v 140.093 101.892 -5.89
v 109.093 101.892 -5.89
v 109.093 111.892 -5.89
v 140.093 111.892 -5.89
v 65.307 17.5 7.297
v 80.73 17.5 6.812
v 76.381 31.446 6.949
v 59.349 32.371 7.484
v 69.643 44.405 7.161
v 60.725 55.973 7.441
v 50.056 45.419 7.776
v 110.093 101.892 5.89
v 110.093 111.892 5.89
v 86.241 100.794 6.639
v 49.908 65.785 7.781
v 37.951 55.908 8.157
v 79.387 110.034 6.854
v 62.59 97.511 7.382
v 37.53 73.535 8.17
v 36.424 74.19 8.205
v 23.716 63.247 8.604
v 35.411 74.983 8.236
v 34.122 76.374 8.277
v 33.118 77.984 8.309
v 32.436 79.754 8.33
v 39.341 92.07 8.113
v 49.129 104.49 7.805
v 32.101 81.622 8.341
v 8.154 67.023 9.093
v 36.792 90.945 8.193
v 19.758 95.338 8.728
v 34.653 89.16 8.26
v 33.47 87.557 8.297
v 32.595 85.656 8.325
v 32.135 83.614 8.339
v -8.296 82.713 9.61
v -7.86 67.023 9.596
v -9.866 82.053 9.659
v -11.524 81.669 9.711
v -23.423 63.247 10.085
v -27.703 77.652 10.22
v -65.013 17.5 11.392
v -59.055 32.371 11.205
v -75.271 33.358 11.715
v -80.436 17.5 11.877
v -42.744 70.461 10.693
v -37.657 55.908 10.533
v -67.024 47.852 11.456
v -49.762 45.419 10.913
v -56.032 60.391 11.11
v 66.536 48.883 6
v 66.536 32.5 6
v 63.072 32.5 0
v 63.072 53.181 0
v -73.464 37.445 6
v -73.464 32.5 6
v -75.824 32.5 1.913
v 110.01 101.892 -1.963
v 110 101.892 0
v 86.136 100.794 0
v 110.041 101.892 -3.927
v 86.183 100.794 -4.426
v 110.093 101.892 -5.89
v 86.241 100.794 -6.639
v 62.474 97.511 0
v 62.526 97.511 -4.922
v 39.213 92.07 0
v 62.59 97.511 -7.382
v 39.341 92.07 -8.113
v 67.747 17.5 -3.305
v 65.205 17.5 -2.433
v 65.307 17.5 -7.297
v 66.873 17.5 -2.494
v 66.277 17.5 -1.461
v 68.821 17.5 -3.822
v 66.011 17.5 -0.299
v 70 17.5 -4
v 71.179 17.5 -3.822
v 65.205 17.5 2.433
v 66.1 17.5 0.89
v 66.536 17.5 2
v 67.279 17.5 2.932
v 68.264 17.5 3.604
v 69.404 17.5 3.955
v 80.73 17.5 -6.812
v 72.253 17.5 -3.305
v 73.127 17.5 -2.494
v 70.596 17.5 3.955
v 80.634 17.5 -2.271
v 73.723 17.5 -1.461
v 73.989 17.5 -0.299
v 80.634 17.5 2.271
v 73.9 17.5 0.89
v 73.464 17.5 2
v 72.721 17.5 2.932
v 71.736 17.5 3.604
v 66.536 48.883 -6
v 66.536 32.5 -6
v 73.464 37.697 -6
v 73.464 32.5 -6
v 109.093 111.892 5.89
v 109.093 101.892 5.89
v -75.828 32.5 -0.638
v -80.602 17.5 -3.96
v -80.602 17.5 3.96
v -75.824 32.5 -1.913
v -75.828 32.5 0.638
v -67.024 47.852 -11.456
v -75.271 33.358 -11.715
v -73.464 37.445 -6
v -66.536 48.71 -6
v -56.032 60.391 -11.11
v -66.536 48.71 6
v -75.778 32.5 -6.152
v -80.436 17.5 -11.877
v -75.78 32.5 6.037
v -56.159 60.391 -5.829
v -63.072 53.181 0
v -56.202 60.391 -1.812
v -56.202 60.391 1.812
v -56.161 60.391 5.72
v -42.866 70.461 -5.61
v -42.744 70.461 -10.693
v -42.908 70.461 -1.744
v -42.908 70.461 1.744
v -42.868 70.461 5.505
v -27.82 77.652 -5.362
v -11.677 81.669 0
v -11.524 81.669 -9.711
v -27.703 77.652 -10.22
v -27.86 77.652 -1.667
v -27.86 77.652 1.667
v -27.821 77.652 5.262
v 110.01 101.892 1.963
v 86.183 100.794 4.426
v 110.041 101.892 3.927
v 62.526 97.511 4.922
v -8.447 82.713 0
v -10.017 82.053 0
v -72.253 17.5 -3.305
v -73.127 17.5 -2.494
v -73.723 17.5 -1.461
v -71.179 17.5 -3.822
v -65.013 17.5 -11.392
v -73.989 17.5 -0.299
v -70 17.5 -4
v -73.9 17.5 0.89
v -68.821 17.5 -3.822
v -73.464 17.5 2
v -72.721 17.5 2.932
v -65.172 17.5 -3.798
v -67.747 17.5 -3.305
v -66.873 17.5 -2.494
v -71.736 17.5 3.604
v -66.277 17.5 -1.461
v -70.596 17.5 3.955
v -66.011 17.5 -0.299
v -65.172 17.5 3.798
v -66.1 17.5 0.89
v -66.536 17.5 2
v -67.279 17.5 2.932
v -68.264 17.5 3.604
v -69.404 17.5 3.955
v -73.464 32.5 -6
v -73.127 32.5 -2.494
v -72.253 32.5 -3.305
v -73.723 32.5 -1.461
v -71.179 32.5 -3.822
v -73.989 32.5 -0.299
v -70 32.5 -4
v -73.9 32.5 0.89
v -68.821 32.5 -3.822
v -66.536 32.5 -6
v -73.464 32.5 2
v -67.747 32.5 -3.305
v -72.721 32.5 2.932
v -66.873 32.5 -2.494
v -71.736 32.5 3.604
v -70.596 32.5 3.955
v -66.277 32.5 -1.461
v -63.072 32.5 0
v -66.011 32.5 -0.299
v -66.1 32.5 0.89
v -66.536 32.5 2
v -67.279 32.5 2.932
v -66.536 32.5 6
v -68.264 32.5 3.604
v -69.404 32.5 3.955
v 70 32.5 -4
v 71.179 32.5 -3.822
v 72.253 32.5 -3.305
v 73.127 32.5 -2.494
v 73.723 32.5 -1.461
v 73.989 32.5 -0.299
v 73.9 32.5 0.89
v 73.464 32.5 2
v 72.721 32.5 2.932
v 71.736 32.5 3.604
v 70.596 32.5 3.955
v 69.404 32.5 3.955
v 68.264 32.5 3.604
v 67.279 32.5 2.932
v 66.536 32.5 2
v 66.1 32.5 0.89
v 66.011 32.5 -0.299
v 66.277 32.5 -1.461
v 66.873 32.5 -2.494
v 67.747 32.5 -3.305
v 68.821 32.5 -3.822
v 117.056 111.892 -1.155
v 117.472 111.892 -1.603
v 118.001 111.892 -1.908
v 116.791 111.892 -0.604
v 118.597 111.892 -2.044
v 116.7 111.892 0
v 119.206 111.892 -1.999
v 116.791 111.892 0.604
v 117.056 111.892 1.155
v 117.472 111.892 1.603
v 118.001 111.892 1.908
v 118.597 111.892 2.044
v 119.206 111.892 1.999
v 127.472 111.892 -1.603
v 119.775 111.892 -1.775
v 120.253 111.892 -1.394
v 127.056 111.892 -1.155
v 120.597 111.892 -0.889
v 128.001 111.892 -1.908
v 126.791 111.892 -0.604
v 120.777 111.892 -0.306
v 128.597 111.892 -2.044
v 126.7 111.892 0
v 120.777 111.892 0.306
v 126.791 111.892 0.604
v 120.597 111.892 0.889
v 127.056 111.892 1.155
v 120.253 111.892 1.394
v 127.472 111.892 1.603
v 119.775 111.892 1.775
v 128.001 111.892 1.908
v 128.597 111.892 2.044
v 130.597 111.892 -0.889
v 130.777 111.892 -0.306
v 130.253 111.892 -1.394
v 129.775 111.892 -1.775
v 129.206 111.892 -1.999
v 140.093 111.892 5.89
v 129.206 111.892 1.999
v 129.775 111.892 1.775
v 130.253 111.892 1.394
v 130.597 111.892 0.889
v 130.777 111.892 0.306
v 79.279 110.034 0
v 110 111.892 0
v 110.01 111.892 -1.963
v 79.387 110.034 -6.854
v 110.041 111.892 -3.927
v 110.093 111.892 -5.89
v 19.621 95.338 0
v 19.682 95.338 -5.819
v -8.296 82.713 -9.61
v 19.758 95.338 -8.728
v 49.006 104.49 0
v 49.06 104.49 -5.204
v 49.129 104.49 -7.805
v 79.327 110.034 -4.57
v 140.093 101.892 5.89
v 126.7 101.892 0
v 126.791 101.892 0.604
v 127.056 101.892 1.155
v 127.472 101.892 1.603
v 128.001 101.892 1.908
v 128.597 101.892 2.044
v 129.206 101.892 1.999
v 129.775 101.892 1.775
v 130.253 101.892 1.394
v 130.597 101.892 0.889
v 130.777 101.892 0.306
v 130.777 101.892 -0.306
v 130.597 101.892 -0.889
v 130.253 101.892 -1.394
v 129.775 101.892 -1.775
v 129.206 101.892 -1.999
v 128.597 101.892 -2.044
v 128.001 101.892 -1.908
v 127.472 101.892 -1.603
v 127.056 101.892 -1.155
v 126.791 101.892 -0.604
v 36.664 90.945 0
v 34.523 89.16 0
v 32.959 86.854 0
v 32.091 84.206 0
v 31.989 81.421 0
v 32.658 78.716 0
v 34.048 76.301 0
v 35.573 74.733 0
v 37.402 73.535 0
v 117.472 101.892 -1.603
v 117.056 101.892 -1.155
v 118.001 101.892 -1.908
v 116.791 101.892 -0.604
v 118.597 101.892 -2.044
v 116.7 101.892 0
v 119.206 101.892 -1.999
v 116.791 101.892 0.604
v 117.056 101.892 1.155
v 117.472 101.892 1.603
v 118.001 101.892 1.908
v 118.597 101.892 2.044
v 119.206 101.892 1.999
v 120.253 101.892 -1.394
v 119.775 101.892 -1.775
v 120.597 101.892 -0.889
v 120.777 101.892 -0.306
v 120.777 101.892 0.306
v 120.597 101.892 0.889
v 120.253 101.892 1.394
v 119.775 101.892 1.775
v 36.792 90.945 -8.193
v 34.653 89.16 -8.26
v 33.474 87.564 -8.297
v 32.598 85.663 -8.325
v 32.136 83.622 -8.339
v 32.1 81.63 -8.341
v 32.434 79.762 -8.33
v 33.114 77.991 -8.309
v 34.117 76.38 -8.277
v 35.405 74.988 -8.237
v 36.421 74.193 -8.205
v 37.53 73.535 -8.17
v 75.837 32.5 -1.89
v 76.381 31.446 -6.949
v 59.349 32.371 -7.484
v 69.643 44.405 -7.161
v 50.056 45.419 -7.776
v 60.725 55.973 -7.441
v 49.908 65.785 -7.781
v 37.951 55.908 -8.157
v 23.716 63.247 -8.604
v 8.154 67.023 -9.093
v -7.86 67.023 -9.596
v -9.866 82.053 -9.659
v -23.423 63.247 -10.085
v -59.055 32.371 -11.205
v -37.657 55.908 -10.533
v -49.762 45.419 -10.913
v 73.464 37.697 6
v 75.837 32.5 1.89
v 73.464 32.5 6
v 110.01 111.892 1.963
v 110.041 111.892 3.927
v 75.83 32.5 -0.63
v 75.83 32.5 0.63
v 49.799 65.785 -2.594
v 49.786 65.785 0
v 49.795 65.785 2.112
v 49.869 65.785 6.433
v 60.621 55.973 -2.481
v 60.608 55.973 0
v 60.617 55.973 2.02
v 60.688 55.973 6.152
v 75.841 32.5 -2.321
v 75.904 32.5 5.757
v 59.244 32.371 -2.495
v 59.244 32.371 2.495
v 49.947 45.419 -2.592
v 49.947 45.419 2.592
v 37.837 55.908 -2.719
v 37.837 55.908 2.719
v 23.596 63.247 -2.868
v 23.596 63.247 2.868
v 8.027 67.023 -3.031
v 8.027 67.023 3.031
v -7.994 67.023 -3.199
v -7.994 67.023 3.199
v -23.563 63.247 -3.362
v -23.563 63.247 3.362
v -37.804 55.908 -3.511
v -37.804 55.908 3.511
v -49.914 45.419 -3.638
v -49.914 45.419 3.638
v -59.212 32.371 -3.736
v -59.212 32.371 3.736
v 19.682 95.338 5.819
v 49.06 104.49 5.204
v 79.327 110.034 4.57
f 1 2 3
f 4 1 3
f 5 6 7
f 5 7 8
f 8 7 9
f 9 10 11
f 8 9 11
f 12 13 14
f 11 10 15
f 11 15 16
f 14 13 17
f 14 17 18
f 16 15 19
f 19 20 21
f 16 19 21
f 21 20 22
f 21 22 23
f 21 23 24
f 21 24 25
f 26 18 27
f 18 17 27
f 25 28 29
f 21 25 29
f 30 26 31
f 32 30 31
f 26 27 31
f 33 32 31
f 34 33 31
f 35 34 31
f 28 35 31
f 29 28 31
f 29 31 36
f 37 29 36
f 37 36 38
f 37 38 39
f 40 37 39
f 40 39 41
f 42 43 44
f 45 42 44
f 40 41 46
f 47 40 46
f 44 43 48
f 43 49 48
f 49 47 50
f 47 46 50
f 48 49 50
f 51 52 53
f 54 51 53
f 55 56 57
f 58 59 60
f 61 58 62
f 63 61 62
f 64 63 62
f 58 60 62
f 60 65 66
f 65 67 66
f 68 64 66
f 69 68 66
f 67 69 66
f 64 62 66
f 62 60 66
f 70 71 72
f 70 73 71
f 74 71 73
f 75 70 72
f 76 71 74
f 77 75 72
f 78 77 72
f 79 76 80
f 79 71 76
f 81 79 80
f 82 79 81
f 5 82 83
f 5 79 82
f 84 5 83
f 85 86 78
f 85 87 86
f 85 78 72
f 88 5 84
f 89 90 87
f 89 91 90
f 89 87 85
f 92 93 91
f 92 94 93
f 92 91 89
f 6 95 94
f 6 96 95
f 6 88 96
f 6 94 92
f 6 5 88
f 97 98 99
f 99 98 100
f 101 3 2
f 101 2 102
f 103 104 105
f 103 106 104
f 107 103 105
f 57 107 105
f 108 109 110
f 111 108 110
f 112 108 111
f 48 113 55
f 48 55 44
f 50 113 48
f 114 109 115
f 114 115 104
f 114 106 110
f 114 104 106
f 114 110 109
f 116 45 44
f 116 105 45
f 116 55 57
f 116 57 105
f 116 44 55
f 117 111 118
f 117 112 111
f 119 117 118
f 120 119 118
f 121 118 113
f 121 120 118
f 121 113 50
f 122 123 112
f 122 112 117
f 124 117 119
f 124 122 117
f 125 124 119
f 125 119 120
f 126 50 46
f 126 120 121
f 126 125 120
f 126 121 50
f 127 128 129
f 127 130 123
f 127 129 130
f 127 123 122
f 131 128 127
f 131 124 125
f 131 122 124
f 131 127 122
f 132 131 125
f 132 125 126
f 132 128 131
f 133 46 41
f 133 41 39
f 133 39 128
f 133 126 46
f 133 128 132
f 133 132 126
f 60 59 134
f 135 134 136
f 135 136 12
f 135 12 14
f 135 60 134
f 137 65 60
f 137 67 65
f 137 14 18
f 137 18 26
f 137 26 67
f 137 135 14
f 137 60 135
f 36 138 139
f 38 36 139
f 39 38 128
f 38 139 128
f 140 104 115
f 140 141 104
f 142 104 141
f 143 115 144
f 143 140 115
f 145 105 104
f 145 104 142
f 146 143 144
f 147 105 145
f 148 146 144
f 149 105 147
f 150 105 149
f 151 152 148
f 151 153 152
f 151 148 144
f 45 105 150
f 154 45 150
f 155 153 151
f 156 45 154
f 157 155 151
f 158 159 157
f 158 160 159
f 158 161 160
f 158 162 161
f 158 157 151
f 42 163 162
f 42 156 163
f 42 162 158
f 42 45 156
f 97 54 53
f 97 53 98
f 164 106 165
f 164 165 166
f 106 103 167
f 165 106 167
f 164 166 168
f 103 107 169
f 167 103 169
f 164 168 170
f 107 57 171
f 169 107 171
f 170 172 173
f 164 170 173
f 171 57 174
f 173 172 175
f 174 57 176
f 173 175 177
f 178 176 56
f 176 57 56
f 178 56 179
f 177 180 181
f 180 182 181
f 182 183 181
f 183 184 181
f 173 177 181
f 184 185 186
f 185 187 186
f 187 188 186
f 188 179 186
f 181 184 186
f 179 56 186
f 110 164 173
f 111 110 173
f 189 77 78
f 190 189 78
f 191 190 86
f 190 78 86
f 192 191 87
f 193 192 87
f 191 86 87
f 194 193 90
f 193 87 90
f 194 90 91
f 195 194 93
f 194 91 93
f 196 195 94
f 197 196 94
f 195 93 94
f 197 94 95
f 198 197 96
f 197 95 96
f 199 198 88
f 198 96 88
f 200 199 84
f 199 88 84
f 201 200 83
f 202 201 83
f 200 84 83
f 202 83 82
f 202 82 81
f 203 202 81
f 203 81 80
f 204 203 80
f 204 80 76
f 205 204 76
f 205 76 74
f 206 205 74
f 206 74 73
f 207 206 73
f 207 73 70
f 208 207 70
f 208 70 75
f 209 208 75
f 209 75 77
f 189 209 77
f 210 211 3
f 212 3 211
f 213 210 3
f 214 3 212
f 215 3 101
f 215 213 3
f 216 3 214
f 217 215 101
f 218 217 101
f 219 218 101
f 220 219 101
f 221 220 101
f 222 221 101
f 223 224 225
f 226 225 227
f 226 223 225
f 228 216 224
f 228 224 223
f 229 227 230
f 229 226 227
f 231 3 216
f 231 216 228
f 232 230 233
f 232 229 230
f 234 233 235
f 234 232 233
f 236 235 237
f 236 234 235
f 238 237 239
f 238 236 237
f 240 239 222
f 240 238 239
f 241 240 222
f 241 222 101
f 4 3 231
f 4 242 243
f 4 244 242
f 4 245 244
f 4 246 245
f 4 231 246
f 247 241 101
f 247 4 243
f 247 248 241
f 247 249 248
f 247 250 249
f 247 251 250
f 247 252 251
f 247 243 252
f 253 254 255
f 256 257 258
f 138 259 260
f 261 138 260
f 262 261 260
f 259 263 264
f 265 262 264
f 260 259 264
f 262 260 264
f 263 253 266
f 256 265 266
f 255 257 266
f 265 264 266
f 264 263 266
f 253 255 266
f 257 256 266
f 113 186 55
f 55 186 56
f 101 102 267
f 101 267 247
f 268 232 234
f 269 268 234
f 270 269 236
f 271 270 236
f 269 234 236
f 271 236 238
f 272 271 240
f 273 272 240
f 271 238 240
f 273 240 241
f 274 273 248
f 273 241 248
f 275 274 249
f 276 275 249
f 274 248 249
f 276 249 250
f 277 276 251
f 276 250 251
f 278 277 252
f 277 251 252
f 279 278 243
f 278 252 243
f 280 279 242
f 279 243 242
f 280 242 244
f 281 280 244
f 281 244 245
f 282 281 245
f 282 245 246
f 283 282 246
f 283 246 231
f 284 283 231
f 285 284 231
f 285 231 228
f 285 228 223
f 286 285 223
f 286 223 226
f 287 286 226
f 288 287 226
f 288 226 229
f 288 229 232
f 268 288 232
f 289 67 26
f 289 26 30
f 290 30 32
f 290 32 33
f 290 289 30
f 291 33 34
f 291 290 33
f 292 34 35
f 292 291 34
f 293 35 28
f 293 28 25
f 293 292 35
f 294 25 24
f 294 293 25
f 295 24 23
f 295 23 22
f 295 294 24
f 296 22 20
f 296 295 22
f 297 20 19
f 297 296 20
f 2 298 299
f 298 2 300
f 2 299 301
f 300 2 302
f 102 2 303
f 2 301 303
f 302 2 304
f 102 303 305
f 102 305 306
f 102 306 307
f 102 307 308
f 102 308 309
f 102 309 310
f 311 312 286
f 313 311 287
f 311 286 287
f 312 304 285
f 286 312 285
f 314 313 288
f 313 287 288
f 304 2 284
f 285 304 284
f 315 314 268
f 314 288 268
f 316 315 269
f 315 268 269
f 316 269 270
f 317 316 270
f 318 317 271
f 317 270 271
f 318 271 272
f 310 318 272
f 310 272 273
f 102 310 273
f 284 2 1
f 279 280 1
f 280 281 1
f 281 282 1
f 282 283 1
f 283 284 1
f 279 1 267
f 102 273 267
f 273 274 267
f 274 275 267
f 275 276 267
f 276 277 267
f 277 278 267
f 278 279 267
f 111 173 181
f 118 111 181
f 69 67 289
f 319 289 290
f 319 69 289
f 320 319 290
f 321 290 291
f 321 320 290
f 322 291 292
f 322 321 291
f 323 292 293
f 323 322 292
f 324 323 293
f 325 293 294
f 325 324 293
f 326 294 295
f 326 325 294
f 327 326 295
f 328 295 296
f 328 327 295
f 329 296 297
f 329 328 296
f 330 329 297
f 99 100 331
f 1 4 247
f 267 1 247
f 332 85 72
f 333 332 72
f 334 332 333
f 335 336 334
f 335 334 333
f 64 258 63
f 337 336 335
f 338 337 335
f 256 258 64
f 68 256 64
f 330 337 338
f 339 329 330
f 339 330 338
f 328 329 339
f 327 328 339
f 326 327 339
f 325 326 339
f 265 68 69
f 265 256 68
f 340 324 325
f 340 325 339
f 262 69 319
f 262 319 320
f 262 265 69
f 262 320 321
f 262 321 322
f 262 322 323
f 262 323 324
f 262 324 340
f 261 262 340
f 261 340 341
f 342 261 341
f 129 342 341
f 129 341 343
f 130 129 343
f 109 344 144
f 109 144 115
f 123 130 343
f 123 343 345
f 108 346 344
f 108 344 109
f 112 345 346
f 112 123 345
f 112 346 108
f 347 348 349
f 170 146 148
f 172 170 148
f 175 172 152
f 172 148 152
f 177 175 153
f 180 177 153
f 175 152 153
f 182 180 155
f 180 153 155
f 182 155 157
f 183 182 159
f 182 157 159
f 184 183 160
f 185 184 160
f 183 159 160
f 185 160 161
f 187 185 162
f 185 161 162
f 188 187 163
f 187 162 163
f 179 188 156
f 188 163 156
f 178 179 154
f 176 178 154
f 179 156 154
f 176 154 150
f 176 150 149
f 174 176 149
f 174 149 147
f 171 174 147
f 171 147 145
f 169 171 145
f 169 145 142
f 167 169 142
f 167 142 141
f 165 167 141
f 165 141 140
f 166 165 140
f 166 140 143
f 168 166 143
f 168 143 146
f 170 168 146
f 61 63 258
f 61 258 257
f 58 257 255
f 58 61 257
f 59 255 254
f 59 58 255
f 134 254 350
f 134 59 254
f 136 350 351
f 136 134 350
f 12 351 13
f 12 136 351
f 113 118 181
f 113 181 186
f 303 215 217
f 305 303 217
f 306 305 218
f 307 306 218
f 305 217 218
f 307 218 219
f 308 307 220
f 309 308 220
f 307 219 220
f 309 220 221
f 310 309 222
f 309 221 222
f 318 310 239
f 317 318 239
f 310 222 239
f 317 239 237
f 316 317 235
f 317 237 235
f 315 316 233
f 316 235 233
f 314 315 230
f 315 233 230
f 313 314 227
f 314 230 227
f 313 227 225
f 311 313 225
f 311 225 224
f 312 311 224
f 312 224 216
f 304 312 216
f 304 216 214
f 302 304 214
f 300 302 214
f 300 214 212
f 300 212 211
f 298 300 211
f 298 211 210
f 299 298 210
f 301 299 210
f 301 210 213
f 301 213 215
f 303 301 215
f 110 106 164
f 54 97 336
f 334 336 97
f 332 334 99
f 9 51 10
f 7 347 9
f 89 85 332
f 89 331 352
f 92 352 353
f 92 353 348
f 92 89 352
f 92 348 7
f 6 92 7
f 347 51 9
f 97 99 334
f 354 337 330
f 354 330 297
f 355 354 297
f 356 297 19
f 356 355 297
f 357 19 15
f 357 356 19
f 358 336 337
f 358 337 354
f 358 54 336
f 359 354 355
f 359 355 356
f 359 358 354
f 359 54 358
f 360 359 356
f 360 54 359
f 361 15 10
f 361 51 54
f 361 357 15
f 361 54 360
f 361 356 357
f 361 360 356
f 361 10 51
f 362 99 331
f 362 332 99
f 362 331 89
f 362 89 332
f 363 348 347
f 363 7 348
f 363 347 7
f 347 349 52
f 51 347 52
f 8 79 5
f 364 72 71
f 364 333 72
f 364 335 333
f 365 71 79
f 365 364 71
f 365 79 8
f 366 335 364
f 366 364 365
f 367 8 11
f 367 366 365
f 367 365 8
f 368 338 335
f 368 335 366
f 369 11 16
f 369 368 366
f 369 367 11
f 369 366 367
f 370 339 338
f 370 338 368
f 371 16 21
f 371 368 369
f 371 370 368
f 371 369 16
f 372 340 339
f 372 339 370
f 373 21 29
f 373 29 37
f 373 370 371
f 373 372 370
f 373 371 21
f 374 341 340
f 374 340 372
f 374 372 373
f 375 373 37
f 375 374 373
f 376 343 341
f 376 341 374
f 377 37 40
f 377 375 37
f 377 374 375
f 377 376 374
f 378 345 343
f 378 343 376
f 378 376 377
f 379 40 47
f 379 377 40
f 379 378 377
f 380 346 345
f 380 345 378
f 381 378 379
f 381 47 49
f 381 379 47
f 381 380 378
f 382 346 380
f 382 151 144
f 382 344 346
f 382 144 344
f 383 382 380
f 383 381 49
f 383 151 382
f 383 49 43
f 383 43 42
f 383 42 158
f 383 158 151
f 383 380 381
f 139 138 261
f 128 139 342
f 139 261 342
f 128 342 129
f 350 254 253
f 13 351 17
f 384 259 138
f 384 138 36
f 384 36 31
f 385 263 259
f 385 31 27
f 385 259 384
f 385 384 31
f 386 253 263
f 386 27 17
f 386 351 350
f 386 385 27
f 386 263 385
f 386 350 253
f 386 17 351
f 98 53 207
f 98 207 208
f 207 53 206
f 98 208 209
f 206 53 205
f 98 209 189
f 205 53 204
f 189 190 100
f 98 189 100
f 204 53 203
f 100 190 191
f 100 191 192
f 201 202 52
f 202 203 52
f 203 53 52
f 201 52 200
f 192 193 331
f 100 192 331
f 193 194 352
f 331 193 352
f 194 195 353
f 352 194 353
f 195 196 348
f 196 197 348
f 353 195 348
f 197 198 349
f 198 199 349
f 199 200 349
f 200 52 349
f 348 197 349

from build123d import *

# Parameters (mm, degrees)
REVOLVE_3_ANGLE           = 1.8
REVOLVE_3_OTHER_WAY_ANGLE = 1.8
CUT_EXTRUDE_1_REACH       = 147.503
SKETCH_9_R                = 4
FILLET_3_R                = 10
EXTRUDE_1_DEPTH           = 1
EXTRUDE_1_DEPTH_BACK      = 30
SKETCH_12_W               = 11.779034654
SKETCH_12_H               = 10
SKETCH_15_R               = 2.05
CUT_EXTRUDE_3_DEPTH       = 20
CUT_EXTRUDE_START         = -15
CUT_EXTRUDE_4_DEPTH       = 25


with BuildPart() as part:
    # 草图1 → 旋转3 (revolve)
    with BuildSketch(Plane.XY):
        with BuildLine():
            Line((110, 111.891696771), (110, 101.891696771))
            ThreePointArc((110, 101.891696771), (59.009804864, 96.84267245), (10, 81.891696771))
            ThreePointArc((10, 81.891696771), (55.584939873, 60.963632268), (80.622577483, 17.5))
            Line((80.622577483, 17.5), (65.192024052, 17.5))
            ThreePointArc((65.192024052, 17.5), (0, 67.5), (-65.192024052, 17.5))
            Line((-65.192024052, 17.5), (-80.622577483, 17.5))
            ThreePointArc((-80.622577483, 17.5), (-55.584939873, 60.963632268), (-10, 81.891696771))
            ThreePointArc((-10, 81.891696771), (48.153415616, 104.278034308), (110, 111.891696771))
        make_face()
    revolve(axis=Axis((297.5, 163.137568082, 0), (0, -1, 0)), revolution_arc=REVOLVE_3_ANGLE)

    # 草图1 → 旋转3 other way (revolve)
    with BuildSketch(Plane.XY):
        with BuildLine():
            Line((110, 111.891696771), (110, 101.891696771))
            ThreePointArc((110, 101.891696771), (59.009804864, 96.84267245), (10, 81.891696771))
            ThreePointArc((10, 81.891696771), (55.584939873, 60.963632268), (80.622577483, 17.5))
            Line((80.622577483, 17.5), (65.192024052, 17.5))
            ThreePointArc((65.192024052, 17.5), (0, 67.5), (-65.192024052, 17.5))
            Line((-65.192024052, 17.5), (-80.622577483, 17.5))
            ThreePointArc((-80.622577483, 17.5), (-55.584939873, 60.963632268), (-10, 81.891696771))
            ThreePointArc((-10, 81.891696771), (48.153415616, 104.278034308), (110, 111.891696771))
        make_face()
    revolve(axis=Axis((297.5, 163.137568082, 0), (0, 1, 0)), revolution_arc=REVOLVE_3_OTHER_WAY_ANGLE)

    # 草图9 → 切除-拉伸1 (cut, up to next)
    with BuildSketch(Plane.XZ.offset(-17.5), mode=Mode.PRIVATE) as cut_extrude_1_sk1:
        with Locations(Location((-70, 0, 0), (0, 0, 270))):
            Circle(SKETCH_9_R)
    cut_extrude_1_tool1 = extrude(cut_extrude_1_sk1.sketch, amount=-CUT_EXTRUDE_1_REACH, mode=Mode.PRIVATE) & part.part
    # 草图9 → 切除-拉伸1 (cut, up to next)
    with BuildSketch(Plane.XZ.offset(-17.5), mode=Mode.PRIVATE) as cut_extrude_1_sk2:
        with Locations(Location((70, 0, 0), (0, 0, 270))):
            Circle(SKETCH_9_R)
    cut_extrude_1_tool2 = extrude(cut_extrude_1_sk2.sketch, amount=-CUT_EXTRUDE_1_REACH, mode=Mode.PRIVATE) & part.part
    add(cut_extrude_1_tool1.solids().sort_by_distance((-70, 17.5, 0))[0], mode=Mode.SUBTRACT)
    add(cut_extrude_1_tool2.solids().sort_by_distance((70, 17.5, 0))[0], mode=Mode.SUBTRACT)

    # 圆角3
    fillet_3_edges = [part.edges().sort_by_distance(p)[0] for p in [
        (10.035468162, 81.891696771, -4.515853727),
        (-9.962064488, 81.891696771, -4.830000073),
    ]]
    fillet(fillet_3_edges, radius=FILLET_3_R)

    # 草图16 → 切除-拉伸4 (cut)
    with BuildSketch(Plane.XZ.offset(-17.5).offset(CUT_EXTRUDE_START)):
        Polygon((-63.07179677, 0), (-66.535898385, 6), (-73.464101615, 6), (-76.92820323, 0), (-73.464101615, -6), (-66.535898385, -6), align=None)
        Polygon((76.92820323, 0), (73.464101615, 6), (66.535898385, 6), (63.07179677, 0), (66.535898385, -6), (73.464101615, -6), align=None)
    extrude(amount=-CUT_EXTRUDE_4_DEPTH, mode=Mode.SUBTRACT)


with BuildPart() as body_2:
    # 草图12 → 凸台-拉伸1 (new, two sides: drawn at the far end of the back side and taken through both)
    with BuildSketch(Plane.ZY.offset(-110.092519931).offset(-EXTRUDE_1_DEPTH_BACK)):
        with Locations((0, 106.891696771)):
            Rectangle(SKETCH_12_W, SKETCH_12_H)
    extrude(amount=EXTRUDE_1_DEPTH + EXTRUDE_1_DEPTH_BACK)

    # 草图15 → 切除-拉伸3 (cut)
    with BuildSketch(Plane(origin=(0, 111.891696771, 0), x_dir=(1, 0, 0), z_dir=(0, 1, 0))):
        with Locations(Location((128.75, 0, 0), (0, 0, 180))):
            Circle(SKETCH_15_R)
        with Locations(Location((118.75, 0, 0), (0, 0, 180))):
            Circle(SKETCH_15_R)
    extrude(amount=-CUT_EXTRUDE_3_DEPTH, mode=Mode.SUBTRACT)


solid = Compound([part.part, body_2.part])
